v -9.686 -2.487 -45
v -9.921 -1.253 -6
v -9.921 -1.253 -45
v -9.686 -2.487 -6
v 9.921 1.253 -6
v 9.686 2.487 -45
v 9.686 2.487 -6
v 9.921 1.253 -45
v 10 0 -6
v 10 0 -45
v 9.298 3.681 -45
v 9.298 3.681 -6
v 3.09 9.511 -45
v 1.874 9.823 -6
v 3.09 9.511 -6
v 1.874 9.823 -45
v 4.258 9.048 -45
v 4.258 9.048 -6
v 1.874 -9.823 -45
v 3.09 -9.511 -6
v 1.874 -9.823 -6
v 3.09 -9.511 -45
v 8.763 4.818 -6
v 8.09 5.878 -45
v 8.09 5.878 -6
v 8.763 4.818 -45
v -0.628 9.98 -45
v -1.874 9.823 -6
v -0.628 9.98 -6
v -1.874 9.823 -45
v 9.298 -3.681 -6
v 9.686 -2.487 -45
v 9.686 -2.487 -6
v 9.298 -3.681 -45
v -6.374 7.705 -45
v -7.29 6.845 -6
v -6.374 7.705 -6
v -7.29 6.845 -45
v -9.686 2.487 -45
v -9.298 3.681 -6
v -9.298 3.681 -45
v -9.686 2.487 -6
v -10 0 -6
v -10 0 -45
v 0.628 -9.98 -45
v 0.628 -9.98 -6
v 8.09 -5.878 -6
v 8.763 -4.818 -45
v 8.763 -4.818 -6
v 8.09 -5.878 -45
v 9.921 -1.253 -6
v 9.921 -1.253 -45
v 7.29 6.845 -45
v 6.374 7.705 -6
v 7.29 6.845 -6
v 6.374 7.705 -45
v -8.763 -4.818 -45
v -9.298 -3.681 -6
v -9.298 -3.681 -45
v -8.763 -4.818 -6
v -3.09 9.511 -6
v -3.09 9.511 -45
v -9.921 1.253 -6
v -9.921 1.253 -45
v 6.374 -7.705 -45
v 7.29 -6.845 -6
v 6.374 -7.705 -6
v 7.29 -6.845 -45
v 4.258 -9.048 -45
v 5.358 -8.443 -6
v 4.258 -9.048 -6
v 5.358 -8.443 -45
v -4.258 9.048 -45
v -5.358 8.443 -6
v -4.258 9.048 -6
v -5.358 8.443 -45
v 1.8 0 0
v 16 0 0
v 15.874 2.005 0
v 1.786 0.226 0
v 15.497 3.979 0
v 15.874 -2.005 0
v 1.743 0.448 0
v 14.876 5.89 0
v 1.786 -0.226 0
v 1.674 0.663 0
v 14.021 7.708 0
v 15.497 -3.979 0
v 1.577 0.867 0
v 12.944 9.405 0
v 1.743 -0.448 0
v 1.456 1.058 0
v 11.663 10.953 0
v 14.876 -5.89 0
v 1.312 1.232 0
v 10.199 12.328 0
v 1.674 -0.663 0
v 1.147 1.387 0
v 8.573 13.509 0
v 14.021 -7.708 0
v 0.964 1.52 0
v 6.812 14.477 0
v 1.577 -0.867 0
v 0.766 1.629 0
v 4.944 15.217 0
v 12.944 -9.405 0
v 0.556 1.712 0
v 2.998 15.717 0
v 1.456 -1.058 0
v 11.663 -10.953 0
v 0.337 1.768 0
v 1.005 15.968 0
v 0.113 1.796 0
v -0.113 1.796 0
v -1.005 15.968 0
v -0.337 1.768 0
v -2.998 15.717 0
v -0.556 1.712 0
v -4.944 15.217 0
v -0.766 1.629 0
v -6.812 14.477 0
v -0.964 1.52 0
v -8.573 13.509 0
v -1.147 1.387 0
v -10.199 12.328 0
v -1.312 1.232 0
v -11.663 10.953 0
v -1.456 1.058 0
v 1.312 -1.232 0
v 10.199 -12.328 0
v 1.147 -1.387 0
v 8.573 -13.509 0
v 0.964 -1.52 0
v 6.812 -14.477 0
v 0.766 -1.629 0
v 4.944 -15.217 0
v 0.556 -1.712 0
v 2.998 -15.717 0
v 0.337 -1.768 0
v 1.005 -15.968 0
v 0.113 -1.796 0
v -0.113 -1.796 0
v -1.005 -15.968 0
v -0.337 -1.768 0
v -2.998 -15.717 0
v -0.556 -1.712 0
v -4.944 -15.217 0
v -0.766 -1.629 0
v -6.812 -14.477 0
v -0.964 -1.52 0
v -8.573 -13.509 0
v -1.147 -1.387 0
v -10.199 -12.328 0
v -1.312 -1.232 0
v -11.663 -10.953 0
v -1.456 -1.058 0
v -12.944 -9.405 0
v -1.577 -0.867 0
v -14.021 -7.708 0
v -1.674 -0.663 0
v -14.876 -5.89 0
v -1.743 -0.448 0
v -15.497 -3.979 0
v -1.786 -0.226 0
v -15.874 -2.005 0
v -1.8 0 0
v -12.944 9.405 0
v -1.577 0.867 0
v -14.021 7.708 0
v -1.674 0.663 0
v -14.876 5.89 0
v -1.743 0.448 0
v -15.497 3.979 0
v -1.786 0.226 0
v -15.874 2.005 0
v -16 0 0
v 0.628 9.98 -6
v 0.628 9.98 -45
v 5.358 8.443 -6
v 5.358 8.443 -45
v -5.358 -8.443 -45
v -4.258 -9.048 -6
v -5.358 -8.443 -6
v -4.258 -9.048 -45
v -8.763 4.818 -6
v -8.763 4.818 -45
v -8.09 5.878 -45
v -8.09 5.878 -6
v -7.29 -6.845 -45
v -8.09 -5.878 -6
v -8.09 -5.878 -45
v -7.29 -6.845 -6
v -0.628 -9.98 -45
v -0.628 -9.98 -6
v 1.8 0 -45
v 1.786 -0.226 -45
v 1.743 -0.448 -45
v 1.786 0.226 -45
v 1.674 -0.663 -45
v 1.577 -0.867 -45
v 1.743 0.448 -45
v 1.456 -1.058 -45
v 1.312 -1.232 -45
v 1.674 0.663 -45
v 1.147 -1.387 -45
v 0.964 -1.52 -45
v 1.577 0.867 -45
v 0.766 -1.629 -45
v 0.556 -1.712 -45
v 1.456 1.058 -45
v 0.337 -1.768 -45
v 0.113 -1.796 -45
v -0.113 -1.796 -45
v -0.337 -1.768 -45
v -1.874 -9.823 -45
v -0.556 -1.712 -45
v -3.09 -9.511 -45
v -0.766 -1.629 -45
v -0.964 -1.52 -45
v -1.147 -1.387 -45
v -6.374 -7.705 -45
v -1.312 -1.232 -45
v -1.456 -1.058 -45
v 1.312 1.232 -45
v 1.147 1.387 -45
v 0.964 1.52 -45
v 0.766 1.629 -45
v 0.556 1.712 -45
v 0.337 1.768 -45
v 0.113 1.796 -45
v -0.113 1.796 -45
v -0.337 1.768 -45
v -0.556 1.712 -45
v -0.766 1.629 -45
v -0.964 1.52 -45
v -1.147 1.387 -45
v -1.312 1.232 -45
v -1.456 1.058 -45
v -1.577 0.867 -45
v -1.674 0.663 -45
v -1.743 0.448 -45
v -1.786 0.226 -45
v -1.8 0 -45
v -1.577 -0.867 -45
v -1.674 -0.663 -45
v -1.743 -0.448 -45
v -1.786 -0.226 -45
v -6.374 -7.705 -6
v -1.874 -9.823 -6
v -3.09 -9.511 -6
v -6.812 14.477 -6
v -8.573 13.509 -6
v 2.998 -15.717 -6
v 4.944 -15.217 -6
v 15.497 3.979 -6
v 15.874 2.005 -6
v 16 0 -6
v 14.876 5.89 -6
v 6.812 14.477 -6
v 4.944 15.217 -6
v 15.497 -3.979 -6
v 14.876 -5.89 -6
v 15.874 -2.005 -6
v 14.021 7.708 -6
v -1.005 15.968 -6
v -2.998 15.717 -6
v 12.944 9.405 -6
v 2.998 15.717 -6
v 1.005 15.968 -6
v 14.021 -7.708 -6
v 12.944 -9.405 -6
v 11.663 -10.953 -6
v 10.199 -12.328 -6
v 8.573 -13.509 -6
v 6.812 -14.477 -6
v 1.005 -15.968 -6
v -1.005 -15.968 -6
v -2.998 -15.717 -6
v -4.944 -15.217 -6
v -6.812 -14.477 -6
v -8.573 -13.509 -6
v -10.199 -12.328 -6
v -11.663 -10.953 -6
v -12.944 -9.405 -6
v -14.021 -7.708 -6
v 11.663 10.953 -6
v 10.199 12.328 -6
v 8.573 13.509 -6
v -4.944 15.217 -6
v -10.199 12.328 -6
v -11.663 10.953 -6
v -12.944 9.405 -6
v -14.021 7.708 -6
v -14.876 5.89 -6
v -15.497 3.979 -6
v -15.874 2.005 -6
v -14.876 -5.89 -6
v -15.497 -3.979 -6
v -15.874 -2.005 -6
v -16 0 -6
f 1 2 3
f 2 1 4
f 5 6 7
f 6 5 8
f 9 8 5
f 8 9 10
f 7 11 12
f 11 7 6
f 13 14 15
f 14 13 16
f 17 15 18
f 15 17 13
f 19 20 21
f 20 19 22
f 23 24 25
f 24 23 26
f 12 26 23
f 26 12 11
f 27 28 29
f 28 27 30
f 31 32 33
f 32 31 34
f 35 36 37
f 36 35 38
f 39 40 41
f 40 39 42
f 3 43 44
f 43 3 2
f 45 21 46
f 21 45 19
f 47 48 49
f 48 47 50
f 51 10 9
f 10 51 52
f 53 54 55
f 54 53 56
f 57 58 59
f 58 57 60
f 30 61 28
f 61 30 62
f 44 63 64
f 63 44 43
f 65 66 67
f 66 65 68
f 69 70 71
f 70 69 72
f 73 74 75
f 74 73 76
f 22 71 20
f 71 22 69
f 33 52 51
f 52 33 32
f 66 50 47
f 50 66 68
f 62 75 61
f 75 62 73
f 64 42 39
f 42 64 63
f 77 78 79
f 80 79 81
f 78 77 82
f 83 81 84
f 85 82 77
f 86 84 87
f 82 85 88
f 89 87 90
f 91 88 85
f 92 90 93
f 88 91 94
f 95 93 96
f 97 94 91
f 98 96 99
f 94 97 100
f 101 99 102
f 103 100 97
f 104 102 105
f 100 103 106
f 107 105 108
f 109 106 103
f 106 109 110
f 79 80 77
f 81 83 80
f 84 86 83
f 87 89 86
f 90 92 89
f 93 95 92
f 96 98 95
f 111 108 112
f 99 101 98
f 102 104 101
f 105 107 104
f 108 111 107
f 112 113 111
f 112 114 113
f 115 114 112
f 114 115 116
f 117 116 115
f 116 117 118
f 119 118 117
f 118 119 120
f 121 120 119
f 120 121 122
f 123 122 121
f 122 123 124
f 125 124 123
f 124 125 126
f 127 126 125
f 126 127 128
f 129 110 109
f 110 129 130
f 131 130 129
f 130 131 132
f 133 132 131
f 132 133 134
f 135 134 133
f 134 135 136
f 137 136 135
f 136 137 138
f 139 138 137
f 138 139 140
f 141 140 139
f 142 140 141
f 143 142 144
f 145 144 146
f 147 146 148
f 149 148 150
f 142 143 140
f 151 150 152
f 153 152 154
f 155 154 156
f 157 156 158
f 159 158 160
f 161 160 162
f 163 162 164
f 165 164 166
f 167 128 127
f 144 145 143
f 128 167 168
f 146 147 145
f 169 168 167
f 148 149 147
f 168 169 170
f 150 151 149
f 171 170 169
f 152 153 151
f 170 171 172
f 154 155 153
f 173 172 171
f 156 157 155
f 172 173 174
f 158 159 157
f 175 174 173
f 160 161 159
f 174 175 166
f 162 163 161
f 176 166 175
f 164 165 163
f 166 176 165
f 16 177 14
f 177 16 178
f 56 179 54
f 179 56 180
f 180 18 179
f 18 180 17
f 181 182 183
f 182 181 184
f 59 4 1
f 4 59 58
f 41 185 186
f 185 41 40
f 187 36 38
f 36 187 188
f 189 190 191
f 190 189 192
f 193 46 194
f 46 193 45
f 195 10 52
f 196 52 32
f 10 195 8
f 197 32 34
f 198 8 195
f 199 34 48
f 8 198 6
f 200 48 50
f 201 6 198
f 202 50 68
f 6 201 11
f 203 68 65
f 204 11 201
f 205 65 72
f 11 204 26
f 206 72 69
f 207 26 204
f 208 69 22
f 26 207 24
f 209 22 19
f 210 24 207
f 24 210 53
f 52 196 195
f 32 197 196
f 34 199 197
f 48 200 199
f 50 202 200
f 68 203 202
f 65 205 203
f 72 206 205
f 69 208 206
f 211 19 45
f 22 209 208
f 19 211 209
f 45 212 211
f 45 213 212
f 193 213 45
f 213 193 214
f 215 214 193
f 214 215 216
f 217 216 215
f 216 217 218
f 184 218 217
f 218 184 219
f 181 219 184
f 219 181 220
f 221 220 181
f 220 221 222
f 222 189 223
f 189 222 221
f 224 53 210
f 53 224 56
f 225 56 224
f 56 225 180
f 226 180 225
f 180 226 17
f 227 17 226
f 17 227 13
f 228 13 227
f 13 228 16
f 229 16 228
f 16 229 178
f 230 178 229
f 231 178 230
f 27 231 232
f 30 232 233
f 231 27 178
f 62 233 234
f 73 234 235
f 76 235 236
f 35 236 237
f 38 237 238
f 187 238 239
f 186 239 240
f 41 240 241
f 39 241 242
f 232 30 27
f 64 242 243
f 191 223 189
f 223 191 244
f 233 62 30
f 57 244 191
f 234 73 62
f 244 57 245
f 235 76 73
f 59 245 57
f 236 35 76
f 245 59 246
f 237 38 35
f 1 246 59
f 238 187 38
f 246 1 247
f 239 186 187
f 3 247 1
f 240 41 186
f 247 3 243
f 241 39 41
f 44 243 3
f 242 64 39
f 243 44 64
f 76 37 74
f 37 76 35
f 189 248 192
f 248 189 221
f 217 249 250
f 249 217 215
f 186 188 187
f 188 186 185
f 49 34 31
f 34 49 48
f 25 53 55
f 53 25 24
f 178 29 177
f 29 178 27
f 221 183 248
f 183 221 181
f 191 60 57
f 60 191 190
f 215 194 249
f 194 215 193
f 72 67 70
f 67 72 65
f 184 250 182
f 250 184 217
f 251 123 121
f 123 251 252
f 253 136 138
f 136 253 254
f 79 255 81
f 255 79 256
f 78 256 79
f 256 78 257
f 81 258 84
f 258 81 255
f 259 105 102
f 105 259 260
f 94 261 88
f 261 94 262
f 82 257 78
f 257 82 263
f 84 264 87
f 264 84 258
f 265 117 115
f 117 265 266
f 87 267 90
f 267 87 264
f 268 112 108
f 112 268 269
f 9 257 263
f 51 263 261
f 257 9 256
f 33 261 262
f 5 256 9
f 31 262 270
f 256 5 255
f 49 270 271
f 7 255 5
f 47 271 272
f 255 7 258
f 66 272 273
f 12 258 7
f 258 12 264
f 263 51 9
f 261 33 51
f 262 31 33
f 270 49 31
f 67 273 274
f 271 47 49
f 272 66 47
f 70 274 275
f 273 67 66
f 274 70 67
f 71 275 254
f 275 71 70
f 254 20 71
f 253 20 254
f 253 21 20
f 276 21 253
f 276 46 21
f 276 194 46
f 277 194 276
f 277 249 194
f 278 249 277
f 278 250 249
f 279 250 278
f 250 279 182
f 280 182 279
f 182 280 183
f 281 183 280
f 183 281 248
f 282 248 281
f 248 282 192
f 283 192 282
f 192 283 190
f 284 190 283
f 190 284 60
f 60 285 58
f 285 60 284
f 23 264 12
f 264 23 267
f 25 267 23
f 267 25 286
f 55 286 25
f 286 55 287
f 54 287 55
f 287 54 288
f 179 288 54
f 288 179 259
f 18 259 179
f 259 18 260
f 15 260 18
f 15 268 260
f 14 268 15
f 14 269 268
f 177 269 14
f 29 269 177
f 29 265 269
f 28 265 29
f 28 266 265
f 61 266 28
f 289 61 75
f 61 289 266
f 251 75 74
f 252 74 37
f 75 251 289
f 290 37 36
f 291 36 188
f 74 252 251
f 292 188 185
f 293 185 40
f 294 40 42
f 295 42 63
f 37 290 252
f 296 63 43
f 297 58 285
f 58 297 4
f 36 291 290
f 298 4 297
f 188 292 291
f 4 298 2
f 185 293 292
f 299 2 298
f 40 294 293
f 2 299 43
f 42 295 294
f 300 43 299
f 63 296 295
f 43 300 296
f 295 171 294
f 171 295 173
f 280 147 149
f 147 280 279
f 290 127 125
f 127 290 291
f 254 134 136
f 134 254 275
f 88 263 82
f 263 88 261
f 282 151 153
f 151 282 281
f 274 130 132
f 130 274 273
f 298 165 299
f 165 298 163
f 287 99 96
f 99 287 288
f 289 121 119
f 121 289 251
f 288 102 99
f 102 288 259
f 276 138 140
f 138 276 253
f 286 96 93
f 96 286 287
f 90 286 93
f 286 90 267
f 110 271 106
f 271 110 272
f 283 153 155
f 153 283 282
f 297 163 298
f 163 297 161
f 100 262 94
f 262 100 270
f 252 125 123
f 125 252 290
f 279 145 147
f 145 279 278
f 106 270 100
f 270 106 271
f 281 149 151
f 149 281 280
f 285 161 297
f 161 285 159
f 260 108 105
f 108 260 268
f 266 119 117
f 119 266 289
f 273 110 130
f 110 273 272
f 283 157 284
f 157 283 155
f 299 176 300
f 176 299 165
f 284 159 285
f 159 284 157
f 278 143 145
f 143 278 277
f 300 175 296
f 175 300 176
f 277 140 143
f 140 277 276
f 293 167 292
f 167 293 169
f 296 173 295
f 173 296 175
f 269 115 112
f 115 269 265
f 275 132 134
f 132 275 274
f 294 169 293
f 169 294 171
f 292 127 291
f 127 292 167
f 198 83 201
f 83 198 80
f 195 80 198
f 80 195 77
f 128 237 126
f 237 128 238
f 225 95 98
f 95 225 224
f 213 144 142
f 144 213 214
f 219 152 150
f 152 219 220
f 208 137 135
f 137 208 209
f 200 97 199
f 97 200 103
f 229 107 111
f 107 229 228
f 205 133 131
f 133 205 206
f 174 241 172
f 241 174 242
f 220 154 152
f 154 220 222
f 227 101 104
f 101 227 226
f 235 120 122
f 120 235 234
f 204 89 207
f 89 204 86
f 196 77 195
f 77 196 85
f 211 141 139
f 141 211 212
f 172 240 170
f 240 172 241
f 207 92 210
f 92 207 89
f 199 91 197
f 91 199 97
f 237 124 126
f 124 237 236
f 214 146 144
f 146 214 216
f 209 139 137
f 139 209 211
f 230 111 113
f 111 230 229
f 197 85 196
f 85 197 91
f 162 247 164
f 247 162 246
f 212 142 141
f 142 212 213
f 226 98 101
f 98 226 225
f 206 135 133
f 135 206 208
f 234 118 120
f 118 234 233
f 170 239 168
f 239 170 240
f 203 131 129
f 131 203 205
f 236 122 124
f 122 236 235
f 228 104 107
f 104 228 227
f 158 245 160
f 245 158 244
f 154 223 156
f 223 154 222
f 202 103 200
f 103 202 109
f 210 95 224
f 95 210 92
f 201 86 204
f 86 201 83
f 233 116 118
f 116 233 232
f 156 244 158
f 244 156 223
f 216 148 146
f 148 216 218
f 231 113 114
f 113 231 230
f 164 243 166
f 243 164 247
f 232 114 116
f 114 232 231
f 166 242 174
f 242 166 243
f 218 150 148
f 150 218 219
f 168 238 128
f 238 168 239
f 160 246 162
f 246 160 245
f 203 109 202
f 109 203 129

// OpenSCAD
$fn = 50;


difference() {
	union() {
		translate(v = [0, 0, -45.0000000000]) {
			cylinder(h = 45, r = 10.0000000000);
		}
		translate(v = [0, 0, -6.0000000000]) {
			cylinder(h = 6, r = 16.0000000000);
		}
	}
	union() {
		#translate(v = [0, 0, -45]) {
			cylinder(h = 45, r = 1.8000000000);
		}
	}
}
